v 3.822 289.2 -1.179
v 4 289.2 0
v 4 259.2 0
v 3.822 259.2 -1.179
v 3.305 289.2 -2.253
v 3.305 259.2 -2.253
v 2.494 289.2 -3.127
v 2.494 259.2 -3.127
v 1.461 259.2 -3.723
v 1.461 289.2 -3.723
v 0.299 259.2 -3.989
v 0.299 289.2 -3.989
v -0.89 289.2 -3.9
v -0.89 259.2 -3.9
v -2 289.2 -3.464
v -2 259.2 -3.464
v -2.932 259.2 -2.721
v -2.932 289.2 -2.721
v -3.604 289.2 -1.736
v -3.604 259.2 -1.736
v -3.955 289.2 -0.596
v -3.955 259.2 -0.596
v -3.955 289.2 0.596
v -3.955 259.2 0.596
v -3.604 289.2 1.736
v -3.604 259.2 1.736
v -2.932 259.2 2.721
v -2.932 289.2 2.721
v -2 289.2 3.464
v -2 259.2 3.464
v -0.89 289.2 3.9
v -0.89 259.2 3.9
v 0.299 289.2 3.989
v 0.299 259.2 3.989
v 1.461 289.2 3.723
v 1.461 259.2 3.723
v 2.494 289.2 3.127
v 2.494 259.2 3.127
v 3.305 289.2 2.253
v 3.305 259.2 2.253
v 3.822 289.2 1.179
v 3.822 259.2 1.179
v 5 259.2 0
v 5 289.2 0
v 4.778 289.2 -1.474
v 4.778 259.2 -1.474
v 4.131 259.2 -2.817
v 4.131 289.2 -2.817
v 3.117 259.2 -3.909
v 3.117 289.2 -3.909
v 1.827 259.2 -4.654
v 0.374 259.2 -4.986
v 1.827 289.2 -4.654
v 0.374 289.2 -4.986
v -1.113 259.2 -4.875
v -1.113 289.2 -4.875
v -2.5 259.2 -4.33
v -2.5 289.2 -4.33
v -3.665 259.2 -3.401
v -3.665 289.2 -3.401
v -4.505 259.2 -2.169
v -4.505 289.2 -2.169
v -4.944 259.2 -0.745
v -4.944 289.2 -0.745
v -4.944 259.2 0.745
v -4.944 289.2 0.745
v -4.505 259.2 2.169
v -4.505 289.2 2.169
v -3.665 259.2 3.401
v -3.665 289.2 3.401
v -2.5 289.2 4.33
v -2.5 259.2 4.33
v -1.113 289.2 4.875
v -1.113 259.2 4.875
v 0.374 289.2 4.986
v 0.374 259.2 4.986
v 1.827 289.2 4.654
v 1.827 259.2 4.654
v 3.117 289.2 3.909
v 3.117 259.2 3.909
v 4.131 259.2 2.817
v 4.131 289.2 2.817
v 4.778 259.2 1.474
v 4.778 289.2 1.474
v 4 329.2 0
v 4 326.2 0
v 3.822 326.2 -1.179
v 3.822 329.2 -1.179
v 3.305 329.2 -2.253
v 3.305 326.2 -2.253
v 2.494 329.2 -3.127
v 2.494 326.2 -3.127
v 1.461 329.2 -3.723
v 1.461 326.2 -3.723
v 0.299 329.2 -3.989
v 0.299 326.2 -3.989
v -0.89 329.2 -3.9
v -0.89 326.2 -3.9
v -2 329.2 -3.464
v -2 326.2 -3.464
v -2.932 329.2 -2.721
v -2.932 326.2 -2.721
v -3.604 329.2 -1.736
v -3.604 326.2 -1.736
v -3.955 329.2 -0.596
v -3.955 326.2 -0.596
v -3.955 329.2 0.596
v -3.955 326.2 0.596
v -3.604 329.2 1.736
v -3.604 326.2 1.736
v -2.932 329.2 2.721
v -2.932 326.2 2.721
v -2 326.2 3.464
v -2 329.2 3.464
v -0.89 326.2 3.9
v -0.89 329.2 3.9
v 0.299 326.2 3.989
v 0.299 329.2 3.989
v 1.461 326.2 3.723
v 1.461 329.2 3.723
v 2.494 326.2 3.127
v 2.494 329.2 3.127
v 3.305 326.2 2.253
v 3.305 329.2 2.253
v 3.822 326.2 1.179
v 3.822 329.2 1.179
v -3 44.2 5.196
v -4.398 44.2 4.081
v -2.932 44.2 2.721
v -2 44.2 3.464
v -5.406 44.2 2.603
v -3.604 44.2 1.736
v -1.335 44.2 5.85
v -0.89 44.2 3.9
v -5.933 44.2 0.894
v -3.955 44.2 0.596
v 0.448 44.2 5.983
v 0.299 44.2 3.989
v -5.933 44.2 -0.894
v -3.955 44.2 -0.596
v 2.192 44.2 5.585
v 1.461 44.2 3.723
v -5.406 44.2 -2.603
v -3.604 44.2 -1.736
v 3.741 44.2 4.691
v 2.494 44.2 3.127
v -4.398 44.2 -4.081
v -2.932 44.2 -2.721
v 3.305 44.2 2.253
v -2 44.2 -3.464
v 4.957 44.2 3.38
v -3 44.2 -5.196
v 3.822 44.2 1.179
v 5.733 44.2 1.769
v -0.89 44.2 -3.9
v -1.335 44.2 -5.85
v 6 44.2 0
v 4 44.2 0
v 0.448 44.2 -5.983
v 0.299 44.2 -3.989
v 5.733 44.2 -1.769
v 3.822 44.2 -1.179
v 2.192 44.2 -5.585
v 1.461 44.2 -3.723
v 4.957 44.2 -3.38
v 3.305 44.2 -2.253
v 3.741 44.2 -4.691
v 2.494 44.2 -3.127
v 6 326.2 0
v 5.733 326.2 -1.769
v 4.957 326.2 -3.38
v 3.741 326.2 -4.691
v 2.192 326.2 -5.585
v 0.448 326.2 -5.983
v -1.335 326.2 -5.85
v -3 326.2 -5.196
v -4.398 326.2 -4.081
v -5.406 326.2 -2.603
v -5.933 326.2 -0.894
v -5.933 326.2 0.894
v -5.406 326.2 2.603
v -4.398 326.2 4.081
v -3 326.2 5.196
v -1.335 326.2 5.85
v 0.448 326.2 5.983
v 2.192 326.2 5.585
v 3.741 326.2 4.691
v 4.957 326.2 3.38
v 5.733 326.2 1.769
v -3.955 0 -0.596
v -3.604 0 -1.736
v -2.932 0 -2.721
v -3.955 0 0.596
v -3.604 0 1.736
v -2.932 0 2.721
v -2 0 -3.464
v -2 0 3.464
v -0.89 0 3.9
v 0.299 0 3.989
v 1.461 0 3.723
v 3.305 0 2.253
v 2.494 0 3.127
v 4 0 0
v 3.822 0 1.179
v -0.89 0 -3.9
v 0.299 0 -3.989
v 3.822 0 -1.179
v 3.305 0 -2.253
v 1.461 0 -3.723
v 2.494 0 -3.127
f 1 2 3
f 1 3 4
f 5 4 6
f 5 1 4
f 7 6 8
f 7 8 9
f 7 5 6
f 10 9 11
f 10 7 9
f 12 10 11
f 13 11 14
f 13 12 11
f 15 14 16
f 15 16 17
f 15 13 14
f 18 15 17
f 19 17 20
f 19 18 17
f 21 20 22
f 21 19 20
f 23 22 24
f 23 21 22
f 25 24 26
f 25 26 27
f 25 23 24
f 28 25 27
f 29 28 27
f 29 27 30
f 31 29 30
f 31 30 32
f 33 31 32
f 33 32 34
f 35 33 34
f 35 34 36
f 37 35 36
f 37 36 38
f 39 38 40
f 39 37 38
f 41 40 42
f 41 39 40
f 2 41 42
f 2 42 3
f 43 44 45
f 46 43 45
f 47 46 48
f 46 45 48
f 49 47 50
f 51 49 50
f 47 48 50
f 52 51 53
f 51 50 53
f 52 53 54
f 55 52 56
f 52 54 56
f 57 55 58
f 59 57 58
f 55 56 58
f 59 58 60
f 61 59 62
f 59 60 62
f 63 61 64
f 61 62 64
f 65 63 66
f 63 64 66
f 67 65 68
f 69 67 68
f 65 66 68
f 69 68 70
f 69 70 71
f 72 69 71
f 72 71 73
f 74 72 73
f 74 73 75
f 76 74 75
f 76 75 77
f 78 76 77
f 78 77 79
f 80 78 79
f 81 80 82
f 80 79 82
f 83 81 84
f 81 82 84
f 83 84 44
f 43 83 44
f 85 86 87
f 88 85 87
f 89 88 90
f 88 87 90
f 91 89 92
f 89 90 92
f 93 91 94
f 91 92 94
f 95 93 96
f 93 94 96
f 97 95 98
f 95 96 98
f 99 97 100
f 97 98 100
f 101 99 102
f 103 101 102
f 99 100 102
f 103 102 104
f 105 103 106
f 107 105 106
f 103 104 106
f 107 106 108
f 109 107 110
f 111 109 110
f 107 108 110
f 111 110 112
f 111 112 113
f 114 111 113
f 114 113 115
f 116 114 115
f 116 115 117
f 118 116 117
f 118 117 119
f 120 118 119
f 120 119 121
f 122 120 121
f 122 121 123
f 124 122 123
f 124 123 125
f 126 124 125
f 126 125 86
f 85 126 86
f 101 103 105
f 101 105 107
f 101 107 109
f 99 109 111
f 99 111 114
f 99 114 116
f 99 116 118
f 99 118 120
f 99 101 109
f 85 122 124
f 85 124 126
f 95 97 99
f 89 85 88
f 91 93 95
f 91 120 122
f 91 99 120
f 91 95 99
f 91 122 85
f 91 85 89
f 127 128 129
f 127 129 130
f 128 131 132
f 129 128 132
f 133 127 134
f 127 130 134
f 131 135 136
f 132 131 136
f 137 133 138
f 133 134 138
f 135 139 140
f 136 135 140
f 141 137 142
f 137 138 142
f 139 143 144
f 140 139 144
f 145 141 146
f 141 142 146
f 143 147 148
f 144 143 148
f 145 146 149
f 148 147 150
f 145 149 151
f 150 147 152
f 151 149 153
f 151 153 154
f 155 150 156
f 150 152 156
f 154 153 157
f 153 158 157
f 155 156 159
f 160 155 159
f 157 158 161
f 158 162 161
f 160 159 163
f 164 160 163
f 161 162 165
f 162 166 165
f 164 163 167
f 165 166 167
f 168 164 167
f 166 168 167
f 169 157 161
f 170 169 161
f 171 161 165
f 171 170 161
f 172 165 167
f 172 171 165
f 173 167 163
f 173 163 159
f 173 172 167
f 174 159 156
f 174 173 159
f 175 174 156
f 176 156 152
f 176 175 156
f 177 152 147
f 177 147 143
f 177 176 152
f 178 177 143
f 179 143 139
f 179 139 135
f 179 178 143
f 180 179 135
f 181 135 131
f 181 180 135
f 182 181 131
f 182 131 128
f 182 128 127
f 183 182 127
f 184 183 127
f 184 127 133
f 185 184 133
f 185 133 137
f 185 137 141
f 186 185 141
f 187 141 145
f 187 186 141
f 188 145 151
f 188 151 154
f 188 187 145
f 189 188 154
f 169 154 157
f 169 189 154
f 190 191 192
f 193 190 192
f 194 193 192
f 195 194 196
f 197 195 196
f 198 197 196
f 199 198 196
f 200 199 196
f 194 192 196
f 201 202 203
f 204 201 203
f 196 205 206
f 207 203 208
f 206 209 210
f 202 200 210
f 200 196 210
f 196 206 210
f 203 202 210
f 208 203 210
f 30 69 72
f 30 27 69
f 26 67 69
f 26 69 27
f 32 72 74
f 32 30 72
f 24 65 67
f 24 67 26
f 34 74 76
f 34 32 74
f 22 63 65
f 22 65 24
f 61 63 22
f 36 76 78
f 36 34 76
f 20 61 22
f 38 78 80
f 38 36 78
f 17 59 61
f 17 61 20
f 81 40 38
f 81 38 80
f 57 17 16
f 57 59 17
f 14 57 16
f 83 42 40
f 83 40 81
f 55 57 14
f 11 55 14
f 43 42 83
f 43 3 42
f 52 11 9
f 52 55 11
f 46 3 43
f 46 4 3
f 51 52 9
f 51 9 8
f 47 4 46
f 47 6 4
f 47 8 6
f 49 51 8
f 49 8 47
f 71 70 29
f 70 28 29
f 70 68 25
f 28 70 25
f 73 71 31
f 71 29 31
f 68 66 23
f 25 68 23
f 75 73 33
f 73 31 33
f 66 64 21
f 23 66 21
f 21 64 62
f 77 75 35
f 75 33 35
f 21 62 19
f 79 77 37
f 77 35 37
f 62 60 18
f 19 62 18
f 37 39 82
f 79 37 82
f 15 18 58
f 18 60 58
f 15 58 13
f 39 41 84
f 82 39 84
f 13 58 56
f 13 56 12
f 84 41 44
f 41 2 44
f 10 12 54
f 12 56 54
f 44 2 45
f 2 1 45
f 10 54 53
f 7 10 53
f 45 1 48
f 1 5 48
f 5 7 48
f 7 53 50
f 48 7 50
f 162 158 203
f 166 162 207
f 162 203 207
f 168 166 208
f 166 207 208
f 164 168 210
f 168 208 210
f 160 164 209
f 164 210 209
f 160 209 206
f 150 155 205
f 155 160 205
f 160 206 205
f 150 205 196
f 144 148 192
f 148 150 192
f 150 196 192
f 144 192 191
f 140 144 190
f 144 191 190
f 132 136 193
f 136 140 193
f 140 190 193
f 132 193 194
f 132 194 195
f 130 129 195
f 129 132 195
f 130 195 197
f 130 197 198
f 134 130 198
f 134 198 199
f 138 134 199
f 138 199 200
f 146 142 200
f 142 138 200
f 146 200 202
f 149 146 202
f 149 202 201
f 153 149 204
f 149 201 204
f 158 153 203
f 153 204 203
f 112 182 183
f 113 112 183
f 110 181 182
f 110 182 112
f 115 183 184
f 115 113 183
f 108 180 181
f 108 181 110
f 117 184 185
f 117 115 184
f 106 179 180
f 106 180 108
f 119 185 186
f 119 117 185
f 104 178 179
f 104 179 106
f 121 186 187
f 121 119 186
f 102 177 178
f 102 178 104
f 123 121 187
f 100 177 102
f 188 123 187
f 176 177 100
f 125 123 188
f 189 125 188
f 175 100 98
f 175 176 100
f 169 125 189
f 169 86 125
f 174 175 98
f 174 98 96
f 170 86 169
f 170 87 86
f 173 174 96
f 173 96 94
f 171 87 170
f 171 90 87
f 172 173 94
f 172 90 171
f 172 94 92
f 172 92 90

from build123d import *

# Parameters (mm, degrees)
SKETCH1_R           = 4
BOSS_EXTRUDE1_DEPTH = 329.2
SKETCH2_R           = 6
BOSS_EXTRUDE2_DEPTH = 282
SKETCH4_R           = 5
SKETCH4_R_2         = 4
CUT_EXTRUDE1_DEPTH  = 30


with BuildPart() as part:
    # Sketch1 → Boss-Extrude1 (new body)
    with BuildSketch(Plane(origin=(0, 0, 0), x_dir=(1, 0, 0), z_dir=(0, 1, 0))):
        Circle(SKETCH1_R)
    extrude(amount=BOSS_EXTRUDE1_DEPTH)

    # Sketch2 → Boss-Extrude2 (add)
    with BuildSketch(Plane(origin=(0, 326.2, 0), x_dir=(1, 0, 0), z_dir=(0, 1, 0))):
        Circle(SKETCH2_R)
    extrude(amount=-BOSS_EXTRUDE2_DEPTH)

    # Sketch4 → Cut-Extrude1 (cut)
    with BuildSketch(Plane(origin=(0, 289.2, 0), x_dir=(1, 0, 0), z_dir=(0, 1, 0))):
        Circle(SKETCH4_R)
        Circle(SKETCH4_R_2, mode=Mode.SUBTRACT)
    extrude(amount=-CUT_EXTRUDE1_DEPTH, mode=Mode.SUBTRACT)


solid = part.part
